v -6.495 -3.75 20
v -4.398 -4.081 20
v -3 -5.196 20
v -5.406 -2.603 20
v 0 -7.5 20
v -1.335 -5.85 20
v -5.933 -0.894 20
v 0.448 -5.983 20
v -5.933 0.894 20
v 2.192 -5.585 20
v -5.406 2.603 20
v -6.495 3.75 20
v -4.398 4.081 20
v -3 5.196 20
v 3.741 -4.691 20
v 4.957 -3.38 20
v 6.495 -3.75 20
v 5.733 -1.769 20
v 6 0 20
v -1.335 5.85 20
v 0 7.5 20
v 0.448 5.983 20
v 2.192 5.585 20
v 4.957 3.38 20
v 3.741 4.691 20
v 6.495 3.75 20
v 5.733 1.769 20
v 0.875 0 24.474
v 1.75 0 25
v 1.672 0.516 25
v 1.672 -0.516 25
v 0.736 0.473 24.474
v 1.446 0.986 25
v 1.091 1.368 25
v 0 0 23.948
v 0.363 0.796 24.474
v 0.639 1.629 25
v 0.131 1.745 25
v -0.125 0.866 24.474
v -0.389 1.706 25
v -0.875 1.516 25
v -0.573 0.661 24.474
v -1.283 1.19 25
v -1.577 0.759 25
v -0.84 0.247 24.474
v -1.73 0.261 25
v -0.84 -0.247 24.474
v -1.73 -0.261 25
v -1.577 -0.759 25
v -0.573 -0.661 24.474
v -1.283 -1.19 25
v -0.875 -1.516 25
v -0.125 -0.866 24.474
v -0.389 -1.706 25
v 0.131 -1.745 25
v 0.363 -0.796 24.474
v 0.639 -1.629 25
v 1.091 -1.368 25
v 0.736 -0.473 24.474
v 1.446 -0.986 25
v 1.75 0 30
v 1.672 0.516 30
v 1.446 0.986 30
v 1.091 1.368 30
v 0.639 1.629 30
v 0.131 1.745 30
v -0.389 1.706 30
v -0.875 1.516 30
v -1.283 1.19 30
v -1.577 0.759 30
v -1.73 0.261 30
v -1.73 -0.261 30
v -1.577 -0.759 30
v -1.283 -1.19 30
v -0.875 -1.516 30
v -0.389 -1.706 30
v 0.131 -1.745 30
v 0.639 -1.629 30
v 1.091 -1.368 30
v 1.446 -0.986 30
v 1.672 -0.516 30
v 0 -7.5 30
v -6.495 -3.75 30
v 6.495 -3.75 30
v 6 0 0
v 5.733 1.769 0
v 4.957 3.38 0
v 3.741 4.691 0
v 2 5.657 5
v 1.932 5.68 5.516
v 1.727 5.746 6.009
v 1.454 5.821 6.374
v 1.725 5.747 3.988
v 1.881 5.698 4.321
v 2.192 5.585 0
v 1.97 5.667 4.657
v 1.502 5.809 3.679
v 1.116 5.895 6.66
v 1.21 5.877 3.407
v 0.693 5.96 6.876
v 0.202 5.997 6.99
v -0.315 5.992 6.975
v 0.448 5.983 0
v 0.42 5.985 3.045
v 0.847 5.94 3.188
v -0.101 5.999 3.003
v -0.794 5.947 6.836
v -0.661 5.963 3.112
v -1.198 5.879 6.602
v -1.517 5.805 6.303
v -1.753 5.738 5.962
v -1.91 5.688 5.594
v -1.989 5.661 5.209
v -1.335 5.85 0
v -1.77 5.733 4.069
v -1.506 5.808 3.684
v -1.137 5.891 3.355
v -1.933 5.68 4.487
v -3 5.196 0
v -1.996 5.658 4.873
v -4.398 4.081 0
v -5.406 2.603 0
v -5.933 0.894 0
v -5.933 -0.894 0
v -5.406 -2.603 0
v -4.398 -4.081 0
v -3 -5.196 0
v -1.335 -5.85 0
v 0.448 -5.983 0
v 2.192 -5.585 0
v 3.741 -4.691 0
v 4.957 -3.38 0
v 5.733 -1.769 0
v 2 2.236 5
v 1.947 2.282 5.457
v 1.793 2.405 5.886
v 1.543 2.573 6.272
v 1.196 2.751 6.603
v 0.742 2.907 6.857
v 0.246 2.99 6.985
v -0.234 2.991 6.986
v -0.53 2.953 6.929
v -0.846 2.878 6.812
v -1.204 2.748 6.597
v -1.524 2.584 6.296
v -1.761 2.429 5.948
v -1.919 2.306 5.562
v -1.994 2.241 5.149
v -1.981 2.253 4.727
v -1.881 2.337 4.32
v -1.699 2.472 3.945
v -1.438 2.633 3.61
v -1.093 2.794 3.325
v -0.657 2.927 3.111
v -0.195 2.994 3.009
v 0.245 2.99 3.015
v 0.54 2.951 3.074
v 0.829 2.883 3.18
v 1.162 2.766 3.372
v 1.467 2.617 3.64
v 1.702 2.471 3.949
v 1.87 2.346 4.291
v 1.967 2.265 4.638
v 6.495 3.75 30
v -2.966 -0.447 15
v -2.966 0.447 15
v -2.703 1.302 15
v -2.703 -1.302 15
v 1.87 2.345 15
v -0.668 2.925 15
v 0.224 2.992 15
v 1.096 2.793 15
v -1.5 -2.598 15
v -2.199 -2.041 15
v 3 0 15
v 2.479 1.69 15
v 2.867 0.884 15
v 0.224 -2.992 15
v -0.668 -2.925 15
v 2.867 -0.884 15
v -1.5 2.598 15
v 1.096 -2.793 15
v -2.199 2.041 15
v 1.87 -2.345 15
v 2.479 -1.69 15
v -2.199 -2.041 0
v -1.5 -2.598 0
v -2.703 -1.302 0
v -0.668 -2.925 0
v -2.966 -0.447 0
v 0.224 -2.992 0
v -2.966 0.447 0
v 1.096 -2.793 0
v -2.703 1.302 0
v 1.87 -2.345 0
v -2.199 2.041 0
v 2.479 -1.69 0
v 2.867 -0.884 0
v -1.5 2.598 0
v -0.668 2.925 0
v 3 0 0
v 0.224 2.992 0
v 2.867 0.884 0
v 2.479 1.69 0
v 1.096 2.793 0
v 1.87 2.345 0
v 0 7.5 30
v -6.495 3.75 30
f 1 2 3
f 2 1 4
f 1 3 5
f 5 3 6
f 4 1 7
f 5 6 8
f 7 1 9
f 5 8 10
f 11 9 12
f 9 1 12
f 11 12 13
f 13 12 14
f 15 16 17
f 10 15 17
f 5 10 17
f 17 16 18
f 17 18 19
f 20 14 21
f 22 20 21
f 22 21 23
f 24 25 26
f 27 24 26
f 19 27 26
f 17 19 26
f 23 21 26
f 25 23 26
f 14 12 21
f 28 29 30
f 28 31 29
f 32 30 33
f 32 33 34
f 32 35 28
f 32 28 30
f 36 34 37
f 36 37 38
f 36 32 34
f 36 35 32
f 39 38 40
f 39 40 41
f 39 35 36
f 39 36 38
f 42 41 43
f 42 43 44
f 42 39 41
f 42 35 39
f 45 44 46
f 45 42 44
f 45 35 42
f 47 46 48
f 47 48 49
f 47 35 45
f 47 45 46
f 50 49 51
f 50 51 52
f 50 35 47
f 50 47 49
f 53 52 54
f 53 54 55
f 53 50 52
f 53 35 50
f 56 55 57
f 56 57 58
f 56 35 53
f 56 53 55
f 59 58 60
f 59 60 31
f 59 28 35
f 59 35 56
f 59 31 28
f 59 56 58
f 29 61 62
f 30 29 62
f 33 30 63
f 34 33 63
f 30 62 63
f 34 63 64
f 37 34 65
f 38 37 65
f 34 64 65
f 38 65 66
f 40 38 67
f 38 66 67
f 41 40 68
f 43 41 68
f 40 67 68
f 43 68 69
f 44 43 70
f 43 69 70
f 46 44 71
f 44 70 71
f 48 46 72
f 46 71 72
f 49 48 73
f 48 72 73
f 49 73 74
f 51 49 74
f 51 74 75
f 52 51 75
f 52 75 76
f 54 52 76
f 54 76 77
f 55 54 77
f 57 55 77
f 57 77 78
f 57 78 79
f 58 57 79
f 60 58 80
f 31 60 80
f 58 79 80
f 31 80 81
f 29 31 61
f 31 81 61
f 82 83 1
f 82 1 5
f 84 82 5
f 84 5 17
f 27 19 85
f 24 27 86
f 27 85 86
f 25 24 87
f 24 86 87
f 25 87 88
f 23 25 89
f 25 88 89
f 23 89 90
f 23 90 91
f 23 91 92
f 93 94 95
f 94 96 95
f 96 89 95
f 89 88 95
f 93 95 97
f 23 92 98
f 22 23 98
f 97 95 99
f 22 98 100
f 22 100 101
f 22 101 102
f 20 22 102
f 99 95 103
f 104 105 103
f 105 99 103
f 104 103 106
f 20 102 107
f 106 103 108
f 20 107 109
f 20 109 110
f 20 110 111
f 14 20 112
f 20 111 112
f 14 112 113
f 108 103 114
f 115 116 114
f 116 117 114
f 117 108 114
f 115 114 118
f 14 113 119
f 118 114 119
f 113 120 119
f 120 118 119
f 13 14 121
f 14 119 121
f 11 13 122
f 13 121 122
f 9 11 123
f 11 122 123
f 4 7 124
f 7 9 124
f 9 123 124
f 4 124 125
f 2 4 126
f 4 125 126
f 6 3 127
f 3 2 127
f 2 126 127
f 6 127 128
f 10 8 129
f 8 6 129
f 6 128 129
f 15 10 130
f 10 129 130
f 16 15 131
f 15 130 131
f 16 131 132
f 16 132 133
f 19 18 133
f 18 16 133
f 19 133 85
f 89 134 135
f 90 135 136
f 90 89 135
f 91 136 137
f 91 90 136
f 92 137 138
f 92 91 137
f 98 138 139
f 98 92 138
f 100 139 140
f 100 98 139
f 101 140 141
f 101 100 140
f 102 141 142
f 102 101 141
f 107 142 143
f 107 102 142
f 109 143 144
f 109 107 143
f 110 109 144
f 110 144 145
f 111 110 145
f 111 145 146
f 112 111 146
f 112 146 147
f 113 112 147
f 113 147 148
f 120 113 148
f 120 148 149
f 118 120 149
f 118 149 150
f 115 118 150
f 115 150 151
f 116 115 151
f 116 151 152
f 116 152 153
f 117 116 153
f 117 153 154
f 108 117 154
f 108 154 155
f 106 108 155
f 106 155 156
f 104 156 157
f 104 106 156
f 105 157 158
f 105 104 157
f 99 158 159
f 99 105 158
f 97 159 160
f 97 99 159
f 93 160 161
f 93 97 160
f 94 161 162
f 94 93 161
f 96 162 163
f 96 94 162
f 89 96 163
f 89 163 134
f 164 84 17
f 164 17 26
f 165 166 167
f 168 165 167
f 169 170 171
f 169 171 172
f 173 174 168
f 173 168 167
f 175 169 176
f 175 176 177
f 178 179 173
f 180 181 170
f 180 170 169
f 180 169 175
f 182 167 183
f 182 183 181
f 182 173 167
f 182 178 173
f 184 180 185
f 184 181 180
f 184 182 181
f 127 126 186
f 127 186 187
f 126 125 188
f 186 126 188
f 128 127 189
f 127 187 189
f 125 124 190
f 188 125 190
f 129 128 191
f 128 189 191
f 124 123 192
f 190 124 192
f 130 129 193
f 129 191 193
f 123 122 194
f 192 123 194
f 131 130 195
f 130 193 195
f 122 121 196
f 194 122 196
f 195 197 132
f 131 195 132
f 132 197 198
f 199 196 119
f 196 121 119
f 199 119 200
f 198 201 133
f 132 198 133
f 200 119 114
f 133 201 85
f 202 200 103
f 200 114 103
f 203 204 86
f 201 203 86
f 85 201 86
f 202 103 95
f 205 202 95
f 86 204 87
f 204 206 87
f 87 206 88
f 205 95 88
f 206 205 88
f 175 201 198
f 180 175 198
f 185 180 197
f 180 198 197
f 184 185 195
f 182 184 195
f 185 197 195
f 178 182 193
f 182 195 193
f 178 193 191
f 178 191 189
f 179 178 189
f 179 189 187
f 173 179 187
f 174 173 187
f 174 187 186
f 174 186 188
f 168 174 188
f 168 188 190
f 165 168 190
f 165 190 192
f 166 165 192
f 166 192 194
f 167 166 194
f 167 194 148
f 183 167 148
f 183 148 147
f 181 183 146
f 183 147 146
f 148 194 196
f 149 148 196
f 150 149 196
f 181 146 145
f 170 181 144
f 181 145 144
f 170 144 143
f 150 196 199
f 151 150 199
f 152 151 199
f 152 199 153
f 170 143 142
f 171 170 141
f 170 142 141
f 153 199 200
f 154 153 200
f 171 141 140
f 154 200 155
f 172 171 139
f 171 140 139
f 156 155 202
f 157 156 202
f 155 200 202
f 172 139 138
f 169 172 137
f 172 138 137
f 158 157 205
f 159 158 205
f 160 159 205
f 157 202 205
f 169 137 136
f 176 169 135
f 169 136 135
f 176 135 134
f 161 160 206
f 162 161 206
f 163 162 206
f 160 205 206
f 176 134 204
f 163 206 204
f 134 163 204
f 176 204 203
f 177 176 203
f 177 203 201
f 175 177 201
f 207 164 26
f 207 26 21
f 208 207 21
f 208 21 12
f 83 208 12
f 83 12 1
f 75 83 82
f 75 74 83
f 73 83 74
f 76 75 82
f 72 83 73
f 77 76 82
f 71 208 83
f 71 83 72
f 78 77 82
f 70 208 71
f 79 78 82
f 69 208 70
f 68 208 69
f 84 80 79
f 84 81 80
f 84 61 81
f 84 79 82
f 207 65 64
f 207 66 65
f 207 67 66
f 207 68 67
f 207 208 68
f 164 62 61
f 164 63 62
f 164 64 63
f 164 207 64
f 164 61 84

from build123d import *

# Parameters (mm, degrees)
SKETCH_R        = 6
PAD_DEPTH       = 30
PAD001_DEPTH    = 10
SKETCH002_R     = 1.75
HOLE_DEPTH      = 5
HOLE_TIPS_R     = 1.75
SKETCH003_R     = 3
POCKET_DEPTH    = 15
SKETCH004_R     = 2
POCKET001_DEPTH = 5


with BuildPart() as part:
    # Sketch → Pad (new body)
    with BuildSketch(Plane.XY):
        Circle(SKETCH_R)
    extrude(amount=PAD_DEPTH)

    # Sketch001 (on Face3 of Pad) → Pad001 (join)
    with BuildSketch(Plane.XY.offset(30)):
        Polygon((6.495191, -3.75), (6.495191, 3.75), (0, 7.5), (-6.495191, 3.75), (-6.495191, -3.75), (0, -7.5), align=None)
    extrude(amount=-PAD001_DEPTH)

    # Sketch002 (on Face11 of Pad001) → Hole (cut)
    with BuildSketch(Plane.XY.offset(30)):
        Circle(SKETCH002_R)
    extrude(amount=-HOLE_DEPTH, mode=Mode.SUBTRACT)

    # Hole tips → Hole tip 1 section 0
    with BuildSketch(Plane.XY.offset(25), mode=Mode.PRIVATE) as hole_tip_1_s0:
        Circle(HOLE_TIPS_R)
    loft([hole_tip_1_s0.sketch, Vertex(0, 0, 23.948494)], mode=Mode.SUBTRACT)

    # Sketch003 (on Face2 of Hole) → Pocket (cut)
    with BuildSketch(Plane(origin=(0, 0, 0), x_dir=(1, 0, 0), z_dir=(0, 0, -1))):
        Circle(SKETCH003_R)
    extrude(amount=-POCKET_DEPTH, mode=Mode.SUBTRACT)

    # Sketch004 (on DatumPlane) → Pocket001 (cut)
    with BuildSketch(Plane(origin=(0, 6, 10), x_dir=(1, 0, 0), z_dir=(0, -1, 0))):
        with Locations((0, -5)):
            Circle(SKETCH004_R)
    extrude(amount=POCKET001_DEPTH, mode=Mode.SUBTRACT)


solid = part.part
